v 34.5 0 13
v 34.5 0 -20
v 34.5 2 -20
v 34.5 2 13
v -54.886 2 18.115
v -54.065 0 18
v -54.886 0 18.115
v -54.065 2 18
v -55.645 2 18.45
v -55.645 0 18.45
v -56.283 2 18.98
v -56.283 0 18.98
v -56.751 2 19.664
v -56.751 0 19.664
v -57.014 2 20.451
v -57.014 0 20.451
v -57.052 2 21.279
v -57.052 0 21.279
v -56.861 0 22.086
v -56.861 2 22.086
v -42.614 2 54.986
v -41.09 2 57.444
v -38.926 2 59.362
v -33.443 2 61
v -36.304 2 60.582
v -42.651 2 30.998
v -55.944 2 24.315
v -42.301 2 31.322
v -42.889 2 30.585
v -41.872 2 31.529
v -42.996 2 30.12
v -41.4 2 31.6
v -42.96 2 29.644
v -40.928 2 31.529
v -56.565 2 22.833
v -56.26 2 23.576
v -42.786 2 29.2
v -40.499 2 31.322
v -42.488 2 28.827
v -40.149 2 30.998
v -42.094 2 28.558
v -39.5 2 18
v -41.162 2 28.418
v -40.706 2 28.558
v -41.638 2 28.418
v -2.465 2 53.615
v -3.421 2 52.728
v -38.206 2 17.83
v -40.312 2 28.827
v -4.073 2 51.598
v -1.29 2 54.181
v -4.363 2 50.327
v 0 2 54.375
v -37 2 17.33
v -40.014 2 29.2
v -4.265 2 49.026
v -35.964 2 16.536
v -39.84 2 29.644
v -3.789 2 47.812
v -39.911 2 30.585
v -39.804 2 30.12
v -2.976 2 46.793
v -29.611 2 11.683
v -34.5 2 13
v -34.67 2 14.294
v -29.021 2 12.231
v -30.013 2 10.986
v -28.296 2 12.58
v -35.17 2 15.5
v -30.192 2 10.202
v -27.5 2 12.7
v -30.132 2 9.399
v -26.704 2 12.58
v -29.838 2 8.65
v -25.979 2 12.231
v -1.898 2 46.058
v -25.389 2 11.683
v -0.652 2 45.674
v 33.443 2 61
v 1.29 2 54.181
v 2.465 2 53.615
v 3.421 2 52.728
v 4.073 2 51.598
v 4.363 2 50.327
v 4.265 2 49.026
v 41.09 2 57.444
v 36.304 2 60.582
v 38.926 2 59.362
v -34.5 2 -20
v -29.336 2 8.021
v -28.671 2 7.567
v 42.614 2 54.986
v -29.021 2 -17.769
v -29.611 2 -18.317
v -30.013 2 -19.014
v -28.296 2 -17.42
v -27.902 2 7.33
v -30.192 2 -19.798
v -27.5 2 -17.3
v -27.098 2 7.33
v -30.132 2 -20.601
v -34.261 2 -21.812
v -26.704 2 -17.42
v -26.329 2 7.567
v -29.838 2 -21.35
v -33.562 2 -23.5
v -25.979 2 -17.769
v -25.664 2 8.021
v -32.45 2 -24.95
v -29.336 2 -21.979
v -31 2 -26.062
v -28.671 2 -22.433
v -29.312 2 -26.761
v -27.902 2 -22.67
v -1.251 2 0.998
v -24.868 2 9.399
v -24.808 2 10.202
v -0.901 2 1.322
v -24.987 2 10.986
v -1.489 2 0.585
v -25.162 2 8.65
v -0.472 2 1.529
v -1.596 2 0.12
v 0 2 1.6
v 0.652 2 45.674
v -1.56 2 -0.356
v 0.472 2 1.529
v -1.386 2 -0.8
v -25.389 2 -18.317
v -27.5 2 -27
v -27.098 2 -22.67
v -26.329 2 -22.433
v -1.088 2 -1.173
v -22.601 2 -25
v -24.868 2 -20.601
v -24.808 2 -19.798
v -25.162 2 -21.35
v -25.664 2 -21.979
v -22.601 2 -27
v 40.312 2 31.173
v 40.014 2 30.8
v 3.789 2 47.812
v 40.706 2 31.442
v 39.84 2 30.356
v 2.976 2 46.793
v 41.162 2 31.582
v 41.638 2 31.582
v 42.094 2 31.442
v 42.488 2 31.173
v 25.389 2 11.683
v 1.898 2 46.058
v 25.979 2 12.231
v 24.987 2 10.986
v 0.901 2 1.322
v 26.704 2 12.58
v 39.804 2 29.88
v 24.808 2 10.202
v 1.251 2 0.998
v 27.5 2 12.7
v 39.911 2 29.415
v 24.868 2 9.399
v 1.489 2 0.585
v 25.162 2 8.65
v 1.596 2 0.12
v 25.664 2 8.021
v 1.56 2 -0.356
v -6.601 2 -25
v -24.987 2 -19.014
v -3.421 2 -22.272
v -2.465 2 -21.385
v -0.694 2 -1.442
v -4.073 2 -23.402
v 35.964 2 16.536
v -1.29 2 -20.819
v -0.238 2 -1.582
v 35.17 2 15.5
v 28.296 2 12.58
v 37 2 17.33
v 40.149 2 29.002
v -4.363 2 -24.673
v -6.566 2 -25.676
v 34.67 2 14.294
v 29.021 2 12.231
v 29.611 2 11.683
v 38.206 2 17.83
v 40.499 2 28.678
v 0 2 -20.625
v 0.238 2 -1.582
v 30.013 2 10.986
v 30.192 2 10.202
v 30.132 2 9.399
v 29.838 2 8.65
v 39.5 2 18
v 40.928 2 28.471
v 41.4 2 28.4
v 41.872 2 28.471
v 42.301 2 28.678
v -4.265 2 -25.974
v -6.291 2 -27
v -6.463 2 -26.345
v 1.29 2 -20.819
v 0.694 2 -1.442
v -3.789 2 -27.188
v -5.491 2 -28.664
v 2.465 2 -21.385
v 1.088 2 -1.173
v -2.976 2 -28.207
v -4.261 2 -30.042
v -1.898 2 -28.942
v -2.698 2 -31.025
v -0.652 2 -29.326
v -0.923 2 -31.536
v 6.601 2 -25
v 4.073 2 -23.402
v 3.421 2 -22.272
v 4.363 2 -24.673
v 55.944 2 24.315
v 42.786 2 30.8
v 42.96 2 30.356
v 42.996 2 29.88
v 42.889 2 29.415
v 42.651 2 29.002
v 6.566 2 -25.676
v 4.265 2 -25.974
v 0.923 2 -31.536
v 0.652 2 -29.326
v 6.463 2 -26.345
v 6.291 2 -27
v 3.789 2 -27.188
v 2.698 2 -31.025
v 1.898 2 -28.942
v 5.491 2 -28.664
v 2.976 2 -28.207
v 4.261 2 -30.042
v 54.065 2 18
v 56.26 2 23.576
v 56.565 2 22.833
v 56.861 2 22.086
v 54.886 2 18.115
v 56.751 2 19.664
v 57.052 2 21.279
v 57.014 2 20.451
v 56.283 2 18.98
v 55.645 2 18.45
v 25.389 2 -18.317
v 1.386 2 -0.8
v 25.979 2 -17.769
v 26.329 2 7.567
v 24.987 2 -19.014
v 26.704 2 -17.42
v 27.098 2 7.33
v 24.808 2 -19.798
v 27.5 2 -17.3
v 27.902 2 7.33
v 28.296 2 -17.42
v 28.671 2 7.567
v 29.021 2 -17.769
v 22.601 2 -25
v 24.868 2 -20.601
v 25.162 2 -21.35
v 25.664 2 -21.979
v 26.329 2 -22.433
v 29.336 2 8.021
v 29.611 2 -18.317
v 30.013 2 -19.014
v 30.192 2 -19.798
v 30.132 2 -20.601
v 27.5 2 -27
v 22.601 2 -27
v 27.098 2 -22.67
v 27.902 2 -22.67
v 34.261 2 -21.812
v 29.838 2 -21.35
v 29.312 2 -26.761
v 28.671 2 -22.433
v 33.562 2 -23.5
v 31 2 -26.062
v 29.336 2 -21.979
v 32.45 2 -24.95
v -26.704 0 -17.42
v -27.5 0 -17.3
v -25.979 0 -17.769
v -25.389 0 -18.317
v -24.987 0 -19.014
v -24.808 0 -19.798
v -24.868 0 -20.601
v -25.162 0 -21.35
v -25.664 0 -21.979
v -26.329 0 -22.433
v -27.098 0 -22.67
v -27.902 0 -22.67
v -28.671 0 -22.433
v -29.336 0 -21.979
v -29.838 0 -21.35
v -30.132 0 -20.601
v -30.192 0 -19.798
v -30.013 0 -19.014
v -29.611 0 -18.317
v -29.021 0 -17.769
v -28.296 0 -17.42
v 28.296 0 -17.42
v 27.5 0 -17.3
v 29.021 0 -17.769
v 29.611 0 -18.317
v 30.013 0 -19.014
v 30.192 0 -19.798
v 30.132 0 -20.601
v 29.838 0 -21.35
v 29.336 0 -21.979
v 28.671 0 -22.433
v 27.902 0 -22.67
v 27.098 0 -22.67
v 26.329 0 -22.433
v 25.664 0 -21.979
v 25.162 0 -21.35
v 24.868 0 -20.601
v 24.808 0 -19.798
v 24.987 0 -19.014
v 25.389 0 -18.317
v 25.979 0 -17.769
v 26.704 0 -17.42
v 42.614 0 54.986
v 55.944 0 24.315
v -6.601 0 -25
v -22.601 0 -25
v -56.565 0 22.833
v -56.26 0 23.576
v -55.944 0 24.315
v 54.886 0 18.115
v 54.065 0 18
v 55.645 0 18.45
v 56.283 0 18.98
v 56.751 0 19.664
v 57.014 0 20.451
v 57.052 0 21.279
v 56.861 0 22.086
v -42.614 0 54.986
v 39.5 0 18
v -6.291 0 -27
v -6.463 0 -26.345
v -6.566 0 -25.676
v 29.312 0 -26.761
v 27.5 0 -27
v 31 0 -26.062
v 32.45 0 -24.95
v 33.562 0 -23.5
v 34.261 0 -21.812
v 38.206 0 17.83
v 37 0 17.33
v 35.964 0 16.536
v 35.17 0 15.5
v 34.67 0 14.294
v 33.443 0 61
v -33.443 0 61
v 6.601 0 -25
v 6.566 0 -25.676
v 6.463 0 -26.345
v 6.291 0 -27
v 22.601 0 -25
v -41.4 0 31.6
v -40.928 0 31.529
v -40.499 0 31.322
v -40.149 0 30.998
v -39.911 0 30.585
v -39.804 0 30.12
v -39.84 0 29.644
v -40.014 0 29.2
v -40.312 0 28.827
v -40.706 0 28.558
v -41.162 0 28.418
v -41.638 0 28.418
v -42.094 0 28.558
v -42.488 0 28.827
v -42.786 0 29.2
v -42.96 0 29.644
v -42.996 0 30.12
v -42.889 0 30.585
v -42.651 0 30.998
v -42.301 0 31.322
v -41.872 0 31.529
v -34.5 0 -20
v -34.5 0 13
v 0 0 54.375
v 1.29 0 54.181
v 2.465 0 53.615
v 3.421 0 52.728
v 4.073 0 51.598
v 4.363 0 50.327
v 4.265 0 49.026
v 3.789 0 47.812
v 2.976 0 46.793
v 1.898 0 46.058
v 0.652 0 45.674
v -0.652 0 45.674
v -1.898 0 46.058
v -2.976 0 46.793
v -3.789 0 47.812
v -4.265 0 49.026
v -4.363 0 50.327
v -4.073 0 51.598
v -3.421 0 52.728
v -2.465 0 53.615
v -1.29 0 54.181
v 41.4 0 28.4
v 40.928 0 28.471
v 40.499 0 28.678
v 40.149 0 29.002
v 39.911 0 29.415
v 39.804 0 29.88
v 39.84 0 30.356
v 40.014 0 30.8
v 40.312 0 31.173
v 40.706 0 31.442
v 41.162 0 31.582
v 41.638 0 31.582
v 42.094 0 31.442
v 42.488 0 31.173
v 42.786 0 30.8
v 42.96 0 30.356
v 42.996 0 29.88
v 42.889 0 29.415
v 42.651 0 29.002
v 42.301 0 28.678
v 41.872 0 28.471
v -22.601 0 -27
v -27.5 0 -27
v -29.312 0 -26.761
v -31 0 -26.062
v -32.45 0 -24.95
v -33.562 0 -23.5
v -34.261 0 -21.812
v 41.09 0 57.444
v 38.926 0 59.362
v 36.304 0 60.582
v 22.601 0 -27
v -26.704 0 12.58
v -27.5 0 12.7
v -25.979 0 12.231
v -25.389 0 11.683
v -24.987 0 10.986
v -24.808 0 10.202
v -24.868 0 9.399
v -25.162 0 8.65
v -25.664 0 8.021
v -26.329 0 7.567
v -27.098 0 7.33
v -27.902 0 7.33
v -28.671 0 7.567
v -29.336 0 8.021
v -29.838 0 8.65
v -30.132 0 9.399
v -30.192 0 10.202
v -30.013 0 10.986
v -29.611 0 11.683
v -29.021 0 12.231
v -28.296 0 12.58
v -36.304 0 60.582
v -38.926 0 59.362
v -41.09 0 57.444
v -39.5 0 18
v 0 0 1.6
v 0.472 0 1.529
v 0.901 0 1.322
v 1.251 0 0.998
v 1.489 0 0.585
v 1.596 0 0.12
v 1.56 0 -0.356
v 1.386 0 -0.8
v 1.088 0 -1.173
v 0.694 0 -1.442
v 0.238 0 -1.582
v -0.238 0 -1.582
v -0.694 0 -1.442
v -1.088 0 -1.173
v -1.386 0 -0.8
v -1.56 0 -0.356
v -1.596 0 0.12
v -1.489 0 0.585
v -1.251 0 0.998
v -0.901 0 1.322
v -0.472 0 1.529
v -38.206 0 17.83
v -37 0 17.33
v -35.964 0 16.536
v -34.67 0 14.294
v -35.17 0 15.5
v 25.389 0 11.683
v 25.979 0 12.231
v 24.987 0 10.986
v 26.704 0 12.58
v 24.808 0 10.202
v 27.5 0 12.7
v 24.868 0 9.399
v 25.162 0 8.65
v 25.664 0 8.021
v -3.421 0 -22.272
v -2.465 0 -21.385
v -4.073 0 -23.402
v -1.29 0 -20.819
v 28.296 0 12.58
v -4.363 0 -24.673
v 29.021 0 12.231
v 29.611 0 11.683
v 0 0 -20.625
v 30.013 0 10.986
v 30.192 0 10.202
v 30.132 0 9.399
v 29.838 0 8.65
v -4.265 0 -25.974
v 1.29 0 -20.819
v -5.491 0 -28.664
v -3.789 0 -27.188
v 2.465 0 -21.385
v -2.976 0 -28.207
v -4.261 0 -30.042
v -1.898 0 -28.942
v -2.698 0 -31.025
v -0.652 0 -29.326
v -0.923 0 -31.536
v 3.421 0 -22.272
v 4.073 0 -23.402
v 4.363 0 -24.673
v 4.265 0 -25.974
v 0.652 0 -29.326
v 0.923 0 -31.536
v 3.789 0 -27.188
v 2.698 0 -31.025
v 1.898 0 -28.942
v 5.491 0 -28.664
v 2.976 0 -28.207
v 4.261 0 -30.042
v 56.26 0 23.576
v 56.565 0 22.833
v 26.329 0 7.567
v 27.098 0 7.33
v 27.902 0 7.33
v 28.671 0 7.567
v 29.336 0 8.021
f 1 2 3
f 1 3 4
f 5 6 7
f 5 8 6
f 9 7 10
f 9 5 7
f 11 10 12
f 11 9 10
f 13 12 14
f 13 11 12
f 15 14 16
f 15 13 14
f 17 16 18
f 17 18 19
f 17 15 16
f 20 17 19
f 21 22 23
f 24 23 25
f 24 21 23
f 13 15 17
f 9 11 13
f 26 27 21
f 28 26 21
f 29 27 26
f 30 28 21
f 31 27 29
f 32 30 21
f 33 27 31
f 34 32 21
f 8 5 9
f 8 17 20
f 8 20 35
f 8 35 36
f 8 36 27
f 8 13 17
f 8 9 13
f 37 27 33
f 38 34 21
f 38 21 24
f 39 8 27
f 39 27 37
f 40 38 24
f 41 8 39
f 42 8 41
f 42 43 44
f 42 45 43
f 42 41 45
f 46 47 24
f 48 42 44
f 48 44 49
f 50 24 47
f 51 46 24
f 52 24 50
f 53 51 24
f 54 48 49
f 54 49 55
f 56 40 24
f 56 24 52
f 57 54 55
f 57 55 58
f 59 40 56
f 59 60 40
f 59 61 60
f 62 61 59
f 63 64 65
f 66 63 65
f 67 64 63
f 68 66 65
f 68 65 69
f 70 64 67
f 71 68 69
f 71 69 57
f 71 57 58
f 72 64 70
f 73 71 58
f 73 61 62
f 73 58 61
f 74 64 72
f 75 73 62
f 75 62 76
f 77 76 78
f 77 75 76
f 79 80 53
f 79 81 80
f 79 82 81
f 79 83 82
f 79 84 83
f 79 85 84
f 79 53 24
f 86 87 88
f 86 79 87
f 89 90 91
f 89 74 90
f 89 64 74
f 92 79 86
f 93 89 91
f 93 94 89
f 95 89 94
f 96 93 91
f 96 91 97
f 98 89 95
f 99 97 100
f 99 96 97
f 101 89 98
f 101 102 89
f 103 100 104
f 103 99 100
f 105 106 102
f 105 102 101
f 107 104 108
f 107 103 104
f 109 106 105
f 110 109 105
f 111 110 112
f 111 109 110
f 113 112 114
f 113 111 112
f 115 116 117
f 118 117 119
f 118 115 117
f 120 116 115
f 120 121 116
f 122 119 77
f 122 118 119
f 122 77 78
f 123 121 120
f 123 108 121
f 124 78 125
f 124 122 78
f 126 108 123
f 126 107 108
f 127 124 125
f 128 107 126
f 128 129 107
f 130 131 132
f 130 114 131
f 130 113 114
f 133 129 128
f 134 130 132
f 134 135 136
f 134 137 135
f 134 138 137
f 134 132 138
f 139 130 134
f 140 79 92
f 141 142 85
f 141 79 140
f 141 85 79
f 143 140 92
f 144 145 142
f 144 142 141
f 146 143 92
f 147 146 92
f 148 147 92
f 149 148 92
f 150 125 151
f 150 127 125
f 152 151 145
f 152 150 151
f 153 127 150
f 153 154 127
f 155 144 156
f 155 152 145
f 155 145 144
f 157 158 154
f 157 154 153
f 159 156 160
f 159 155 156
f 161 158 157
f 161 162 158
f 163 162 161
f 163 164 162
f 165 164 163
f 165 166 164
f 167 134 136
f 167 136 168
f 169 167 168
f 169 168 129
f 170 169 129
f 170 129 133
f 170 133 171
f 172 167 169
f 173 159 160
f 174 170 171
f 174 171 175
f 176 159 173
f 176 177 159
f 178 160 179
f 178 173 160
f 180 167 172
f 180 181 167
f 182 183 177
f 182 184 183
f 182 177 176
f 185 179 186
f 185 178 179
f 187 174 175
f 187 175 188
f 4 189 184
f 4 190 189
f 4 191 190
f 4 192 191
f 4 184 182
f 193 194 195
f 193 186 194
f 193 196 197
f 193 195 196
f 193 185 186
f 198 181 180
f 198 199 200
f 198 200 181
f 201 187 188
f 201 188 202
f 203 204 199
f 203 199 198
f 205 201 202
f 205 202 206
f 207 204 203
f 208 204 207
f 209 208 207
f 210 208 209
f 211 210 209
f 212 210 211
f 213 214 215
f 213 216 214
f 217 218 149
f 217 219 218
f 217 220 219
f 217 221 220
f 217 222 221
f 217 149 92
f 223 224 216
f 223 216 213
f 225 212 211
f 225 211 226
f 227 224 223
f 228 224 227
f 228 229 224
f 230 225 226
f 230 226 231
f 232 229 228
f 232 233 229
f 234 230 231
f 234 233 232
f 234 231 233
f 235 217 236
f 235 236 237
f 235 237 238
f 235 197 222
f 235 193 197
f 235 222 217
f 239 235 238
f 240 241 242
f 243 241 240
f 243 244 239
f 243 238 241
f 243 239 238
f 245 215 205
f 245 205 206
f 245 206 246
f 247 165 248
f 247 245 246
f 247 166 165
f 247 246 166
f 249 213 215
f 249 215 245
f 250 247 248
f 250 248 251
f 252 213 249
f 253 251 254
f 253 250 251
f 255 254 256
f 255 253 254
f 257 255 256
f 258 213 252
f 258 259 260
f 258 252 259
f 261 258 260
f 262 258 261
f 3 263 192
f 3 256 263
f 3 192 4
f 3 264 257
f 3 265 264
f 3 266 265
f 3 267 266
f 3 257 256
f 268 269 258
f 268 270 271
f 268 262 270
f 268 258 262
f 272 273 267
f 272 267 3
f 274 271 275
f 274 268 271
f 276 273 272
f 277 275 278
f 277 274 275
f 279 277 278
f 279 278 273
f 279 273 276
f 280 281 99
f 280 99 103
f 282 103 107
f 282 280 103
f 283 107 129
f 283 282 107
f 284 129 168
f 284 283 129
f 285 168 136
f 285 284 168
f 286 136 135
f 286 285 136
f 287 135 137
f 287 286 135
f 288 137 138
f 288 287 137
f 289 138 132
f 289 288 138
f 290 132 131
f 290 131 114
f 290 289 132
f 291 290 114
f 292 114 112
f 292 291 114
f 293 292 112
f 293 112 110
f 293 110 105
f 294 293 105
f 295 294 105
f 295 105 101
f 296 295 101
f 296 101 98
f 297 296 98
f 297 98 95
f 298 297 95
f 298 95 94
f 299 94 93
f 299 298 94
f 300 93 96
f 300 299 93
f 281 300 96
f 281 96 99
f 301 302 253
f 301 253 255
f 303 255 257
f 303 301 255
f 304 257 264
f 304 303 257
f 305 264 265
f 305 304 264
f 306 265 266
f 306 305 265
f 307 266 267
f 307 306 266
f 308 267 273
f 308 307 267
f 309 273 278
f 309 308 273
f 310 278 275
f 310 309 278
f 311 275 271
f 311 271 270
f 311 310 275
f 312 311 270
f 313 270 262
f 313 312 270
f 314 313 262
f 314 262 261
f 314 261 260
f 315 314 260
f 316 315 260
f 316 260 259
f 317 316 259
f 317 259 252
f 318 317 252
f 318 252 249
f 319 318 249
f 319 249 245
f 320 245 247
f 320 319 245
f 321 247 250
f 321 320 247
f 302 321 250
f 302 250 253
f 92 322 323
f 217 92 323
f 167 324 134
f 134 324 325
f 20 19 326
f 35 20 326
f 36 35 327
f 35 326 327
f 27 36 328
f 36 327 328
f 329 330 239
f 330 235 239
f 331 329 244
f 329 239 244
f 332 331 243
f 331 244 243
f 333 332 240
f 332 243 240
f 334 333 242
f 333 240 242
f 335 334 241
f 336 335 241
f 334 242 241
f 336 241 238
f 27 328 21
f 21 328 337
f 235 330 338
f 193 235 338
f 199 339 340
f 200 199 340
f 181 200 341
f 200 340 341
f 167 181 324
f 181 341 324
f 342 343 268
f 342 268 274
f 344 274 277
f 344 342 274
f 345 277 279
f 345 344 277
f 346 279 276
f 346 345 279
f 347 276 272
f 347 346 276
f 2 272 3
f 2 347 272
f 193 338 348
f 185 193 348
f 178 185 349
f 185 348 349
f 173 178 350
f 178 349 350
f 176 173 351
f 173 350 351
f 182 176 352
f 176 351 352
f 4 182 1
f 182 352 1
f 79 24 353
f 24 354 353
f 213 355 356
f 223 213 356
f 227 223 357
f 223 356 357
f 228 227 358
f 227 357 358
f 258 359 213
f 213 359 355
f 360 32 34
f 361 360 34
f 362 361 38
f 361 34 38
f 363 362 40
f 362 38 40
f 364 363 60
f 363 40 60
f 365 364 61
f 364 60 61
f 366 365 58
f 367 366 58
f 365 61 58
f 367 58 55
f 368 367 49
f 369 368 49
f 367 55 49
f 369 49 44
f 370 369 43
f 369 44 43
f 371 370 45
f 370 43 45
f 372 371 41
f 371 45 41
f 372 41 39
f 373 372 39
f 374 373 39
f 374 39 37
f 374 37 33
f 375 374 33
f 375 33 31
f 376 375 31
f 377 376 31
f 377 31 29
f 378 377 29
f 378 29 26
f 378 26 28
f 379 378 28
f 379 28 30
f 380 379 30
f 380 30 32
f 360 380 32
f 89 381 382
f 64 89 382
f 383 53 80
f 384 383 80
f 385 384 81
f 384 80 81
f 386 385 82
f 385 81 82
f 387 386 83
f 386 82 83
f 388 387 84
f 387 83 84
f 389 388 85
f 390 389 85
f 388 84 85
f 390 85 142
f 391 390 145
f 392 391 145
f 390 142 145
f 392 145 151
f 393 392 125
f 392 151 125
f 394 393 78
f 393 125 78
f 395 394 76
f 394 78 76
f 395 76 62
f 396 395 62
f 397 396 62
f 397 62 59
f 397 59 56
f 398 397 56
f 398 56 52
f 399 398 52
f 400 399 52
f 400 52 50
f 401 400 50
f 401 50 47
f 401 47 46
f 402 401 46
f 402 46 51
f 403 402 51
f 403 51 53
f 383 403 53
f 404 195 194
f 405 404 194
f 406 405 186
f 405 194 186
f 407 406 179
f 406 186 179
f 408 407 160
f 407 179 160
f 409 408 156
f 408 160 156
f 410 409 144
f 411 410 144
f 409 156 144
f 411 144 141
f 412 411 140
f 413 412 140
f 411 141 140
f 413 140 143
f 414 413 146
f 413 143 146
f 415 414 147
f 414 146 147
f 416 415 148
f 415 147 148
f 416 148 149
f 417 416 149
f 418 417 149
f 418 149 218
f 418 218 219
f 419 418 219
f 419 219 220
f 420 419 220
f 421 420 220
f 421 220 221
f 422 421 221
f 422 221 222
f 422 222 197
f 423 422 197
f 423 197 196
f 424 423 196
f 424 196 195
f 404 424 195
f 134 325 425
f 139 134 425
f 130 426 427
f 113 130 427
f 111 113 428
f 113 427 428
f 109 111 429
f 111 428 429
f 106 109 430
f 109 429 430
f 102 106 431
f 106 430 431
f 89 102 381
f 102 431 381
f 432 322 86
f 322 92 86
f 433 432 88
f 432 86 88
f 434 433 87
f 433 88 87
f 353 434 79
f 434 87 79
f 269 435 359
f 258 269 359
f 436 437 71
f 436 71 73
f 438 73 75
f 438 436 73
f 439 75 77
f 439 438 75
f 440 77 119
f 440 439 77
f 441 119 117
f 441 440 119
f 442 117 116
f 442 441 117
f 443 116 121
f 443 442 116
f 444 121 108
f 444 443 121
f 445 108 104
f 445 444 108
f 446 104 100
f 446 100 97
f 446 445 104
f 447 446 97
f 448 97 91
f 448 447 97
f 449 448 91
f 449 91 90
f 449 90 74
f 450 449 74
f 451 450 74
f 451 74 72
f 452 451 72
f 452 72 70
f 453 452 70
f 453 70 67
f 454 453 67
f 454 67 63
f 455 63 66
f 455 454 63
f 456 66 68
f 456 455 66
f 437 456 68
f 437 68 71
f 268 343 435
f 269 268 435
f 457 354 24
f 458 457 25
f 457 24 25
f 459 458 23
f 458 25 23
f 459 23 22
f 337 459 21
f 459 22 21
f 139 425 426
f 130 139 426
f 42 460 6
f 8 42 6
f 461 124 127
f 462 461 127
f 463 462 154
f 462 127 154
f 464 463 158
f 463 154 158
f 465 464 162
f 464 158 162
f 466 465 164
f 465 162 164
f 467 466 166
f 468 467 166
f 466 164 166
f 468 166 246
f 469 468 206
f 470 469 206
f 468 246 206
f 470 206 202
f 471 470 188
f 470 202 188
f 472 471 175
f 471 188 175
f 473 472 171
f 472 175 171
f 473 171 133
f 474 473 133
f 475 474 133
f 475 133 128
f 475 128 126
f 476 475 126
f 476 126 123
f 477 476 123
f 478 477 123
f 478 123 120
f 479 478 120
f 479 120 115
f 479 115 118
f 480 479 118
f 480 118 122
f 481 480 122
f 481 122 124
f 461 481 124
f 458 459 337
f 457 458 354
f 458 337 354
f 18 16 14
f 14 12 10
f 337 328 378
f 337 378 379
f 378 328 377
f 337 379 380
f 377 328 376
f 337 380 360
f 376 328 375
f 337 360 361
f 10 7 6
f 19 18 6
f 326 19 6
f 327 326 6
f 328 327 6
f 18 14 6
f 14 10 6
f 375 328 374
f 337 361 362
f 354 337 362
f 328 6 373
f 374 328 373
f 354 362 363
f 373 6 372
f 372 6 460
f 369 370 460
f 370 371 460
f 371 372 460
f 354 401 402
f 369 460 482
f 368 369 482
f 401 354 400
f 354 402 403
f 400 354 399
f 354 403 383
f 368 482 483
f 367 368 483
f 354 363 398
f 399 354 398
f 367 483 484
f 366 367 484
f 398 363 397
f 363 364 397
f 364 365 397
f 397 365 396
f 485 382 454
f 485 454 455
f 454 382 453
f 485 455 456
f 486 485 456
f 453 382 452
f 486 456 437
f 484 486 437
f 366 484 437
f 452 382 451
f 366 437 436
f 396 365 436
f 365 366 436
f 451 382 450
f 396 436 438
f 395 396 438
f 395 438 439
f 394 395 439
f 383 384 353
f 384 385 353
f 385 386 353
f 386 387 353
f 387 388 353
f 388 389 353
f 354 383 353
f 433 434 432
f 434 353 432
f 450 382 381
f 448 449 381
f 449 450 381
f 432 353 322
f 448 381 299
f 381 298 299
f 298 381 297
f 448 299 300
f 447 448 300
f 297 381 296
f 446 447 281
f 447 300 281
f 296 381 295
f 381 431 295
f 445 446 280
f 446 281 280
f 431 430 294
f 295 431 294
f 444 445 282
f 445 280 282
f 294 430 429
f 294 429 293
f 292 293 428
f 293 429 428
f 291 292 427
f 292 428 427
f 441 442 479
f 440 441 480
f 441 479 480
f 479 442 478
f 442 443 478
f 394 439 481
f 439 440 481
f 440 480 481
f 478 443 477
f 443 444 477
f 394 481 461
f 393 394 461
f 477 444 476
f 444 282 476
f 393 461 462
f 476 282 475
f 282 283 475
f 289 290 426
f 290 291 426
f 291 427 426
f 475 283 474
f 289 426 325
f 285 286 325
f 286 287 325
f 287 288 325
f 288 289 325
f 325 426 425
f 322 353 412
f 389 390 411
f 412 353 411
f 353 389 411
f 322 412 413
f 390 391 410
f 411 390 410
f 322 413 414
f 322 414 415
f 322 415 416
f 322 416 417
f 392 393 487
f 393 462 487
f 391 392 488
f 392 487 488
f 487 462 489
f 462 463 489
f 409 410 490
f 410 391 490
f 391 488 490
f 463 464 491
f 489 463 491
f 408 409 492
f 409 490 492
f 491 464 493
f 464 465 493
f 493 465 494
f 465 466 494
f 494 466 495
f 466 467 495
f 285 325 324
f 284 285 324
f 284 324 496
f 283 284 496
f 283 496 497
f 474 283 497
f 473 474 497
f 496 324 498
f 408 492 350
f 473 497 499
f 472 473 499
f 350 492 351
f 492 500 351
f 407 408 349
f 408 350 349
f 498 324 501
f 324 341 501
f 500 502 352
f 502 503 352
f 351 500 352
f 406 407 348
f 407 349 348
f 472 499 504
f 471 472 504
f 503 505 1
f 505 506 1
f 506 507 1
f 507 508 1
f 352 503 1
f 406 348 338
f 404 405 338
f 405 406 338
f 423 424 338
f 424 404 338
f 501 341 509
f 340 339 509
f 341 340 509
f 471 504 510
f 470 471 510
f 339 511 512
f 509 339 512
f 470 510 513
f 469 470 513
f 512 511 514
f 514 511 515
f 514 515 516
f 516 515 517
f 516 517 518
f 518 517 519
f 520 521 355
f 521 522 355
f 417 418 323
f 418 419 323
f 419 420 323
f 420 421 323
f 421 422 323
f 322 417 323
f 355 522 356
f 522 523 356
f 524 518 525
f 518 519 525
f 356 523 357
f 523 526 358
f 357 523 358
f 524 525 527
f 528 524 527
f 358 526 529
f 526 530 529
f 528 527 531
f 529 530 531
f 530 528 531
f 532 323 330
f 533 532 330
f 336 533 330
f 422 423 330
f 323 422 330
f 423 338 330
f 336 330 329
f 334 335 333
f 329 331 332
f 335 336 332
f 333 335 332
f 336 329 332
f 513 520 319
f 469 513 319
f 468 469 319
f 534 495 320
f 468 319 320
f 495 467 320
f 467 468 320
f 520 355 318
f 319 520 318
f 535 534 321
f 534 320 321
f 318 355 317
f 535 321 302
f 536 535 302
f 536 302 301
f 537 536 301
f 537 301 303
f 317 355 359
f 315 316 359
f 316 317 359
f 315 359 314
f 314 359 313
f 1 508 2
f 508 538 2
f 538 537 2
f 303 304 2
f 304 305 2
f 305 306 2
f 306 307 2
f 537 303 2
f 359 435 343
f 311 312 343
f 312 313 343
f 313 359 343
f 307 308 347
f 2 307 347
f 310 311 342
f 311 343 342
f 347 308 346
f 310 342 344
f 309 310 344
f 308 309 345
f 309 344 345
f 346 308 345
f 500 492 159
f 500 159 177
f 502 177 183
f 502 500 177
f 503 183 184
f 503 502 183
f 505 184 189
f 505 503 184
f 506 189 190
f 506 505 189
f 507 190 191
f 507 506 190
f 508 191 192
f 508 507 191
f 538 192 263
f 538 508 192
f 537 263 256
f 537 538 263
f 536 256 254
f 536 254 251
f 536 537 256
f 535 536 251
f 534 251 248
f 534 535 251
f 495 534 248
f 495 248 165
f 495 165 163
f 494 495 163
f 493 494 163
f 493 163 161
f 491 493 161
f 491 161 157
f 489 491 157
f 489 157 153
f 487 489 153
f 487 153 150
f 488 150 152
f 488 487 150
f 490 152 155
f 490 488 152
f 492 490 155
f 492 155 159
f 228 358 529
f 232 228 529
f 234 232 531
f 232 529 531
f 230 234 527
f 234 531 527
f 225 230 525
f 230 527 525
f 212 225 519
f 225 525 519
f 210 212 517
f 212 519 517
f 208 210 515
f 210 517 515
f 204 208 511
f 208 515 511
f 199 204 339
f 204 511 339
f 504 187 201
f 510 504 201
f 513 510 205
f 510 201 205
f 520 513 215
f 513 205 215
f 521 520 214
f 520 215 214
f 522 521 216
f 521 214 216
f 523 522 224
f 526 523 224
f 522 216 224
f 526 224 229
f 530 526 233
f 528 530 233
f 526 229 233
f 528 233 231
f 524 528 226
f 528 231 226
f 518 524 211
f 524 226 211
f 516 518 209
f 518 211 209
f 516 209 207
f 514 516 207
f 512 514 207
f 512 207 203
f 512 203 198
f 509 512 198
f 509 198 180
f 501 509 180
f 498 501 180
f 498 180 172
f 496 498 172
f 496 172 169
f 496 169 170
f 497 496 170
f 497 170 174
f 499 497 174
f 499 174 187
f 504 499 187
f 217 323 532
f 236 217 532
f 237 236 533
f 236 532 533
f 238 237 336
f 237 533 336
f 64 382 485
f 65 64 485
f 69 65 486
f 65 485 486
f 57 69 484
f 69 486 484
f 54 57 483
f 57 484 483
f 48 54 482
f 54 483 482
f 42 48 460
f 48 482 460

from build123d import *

# Parameters (mm, degrees)
SKETCH1_R           = 2.7
BOSS_EXTRUDE1_DEPTH = 2
BOSS_EXTRUDE2_START = -2
BOSS_EXTRUDE2_DEPTH = 2
FILLET1_R           = 3
SKETCH2_R           = 4.375
SKETCH2_R_2         = 1.6
CUT_EXTRUDE1_DEPTH  = 84.55470457
FILLET2_R           = 10


with BuildPart() as part:
    # Sketch1 → Boss-Extrude1 (new body)
    # profile 1 of 9: a face of its own
    with BuildSketch(Plane(origin=(0, 0, 0), x_dir=(1, 0, 0), z_dir=(0, 1, 0))):
        with BuildLine():
            Line((-34.5, 20), (-34.5, -10))
            ThreePointArc((-34.5, -10), (-27.5, -17), (-20.5, -10))
            Line((-20.5, -10), (-20.5, 20))
            ThreePointArc((-20.5, 20), (-27.5, 27), (-34.5, 20))
        make_face()
        with Locations(Location((-27.5, 20, 0), (0, 0, 270))):
            Circle(SKETCH1_R, mode=Mode.SUBTRACT)
        with Locations(Location((-27.5, -10, 0), (0, 0, 270))):
            Circle(SKETCH1_R, mode=Mode.SUBTRACT)
    # profile 2 of 9: a face of its own
    with BuildSketch(Plane(origin=(0, 0, 0), x_dir=(1, 0, 0), z_dir=(0, 1, 0))):
        with BuildLine():
            ThreePointArc((-22.601020514, 25), (-21.046595612, 22.711747002), (-20.5, 20))
            Line((-20.5, 20), (-20.5, -10))
            ThreePointArc((-20.5, -10), (-27.5, -17), (-34.5, -10))
            Line((-34.5, -10), (-34.5, -50.306560208))
            ThreePointArc((-34.5, -50.306560208), (0, -61), (34.5, -50.306560208))
            Line((34.5, -50.306560208), (34.5, -10))
            ThreePointArc((34.5, -10), (27.5, -17), (20.5, -10))
            Line((20.5, -10), (20.5, 20))
            ThreePointArc((20.5, 20), (21.046595612, 22.711747002), (22.601020514, 25))
            Line((22.601020514, 25), (6.601020514, 25))
            ThreePointArc((6.601020514, 25), (0, 18.398979486), (-6.601020514, 25))
            Line((-6.601020514, 25), (-22.601020514, 25))
        make_face()
    # profile 3 of 9: a face of its own
    with BuildSketch(Plane(origin=(0, 0, 0), x_dir=(1, 0, 0), z_dir=(0, 1, 0))):
        with BuildLine():
            ThreePointArc((34.5, -10), (27.5, -17), (20.5, -10))
            Line((20.5, -10), (20.5, 20))
            ThreePointArc((20.5, 20), (27.5, 27), (34.5, 20))
            Line((34.5, 20), (34.5, -10))
        make_face()
        with Locations(Location((27.5, -10, 0), (0, 0, 270))):
            Circle(SKETCH1_R, mode=Mode.SUBTRACT)
        with Locations(Location((27.5, 20, 0), (0, 0, 270))):
            Circle(SKETCH1_R, mode=Mode.SUBTRACT)
    # profile 4 of 9: a face of its own
    with BuildSketch(Plane(origin=(0, 0, 0), x_dir=(1, 0, 0), z_dir=(0, 1, 0))):
        with BuildLine():
            ThreePointArc((-6.290744935, 27), (-6.522990426, 26.011962318), (-6.601020514, 25))
            ThreePointArc((-6.601020514, 25), (0, 18.398979486), (6.601020514, 25))
            ThreePointArc((6.601020514, 25), (6.522990426, 26.011962318), (6.290744935, 27))
            Line((6.290744935, 27), (-6.290744935, 27))
        make_face()
    # profile 5 of 9: a face of its own
    with BuildSketch(Plane(origin=(0, 0, 0), x_dir=(1, 0, 0), z_dir=(0, 1, 0))):
        with BuildLine():
            ThreePointArc((6.290744935, 27), (0, 31.601020514), (-6.290744935, 27))
            Line((-6.290744935, 27), (6.290744935, 27))
        make_face()
    # profile 6 of 9: a face of its own
    with BuildSketch(Plane(origin=(0, 0, 0), x_dir=(1, 0, 0), z_dir=(0, 1, 0))):
        with BuildLine():
            ThreePointArc((-6.290744935, 27), (-6.522990426, 26.011962318), (-6.601020514, 25))
            ThreePointArc((-6.601020514, 25), (0, 18.398979486), (6.601020514, 25))
            ThreePointArc((6.601020514, 25), (6.522990426, 26.011962318), (6.290744935, 27))
            Line((6.290744935, 27), (-6.290744935, 27))
        make_face()
    # profile 7 of 9: a face of its own
    with BuildSketch(Plane(origin=(0, 0, 0), x_dir=(1, 0, 0), z_dir=(0, 1, 0))):
        with BuildLine():
            ThreePointArc((6.290744935, 27), (0, 31.601020514), (-6.290744935, 27))
            Line((-6.290744935, 27), (6.290744935, 27))
        make_face()
    # profile 8 of 9: a face of its own
    with BuildSketch(Plane(origin=(0, 0, 0), x_dir=(1, 0, 0), z_dir=(0, 1, 0))):
        with BuildLine():
            ThreePointArc((-27.5, 27), (-24.854248689, 26.480740698), (-22.601020514, 25))
            Line((-22.601020514, 25), (-22.601020514, 27))
            Line((-22.601020514, 27), (-27.5, 27))
        make_face()
    # profile 9 of 9: a face of its own
    with BuildSketch(Plane(origin=(0, 0, 0), x_dir=(1, 0, 0), z_dir=(0, 1, 0))):
        with BuildLine():
            Line((22.601020514, 27), (22.601020514, 25))
            ThreePointArc((22.601020514, 25), (24.854248689, 26.480740698), (27.5, 27))
            Line((27.5, 27), (22.601020514, 27))
        make_face()
    extrude(amount=BOSS_EXTRUDE1_DEPTH)

    # Sketch5 → Boss-Extrude2 (add)
    with BuildSketch(Plane(origin=(0, 2, 0), x_dir=(1, 0, 0), z_dir=(0, 1, 0)).offset(BOSS_EXTRUDE2_START)):
        with BuildLine():
            Line((-55.944371359, -24.315166322), (-40, -61))
            Line((-40, -61), (0, -61))
            ThreePointArc((0, -61), (-18.059621083, -58.265342068), (-34.5, -50.306560208))
            Line((-34.5, -50.306560208), (-34.5, -13))
            ThreePointArc((-34.5, -13), (-35.964466094, -16.535533906), (-39.5, -18))
            Line((-39.5, -18), (-58.283788484, -18))
            ThreePointArc((-58.283788484, -18), (-57.201297683, -21.189892481), (-55.944371359, -24.315166322))
        make_face()
        with BuildLine():
            ThreePointArc((34.5, -50.306560208), (18.059621083, -58.265342068), (0, -61))
            Line((0, -61), (40, -61))
            Line((40, -61), (55.944371359, -24.315166322))
            ThreePointArc((55.944371359, -24.315166322), (57.201297683, -21.189892481), (58.283788484, -18))
            Line((58.283788484, -18), (39.5, -18))
            ThreePointArc((39.5, -18), (35.964466094, -16.535533906), (34.5, -13))
            Line((34.5, -13), (34.5, -50.306560208))
        make_face()
    extrude(amount=BOSS_EXTRUDE2_DEPTH)

    # Fillet1
    fillet1_edges = [part.edges().sort_by_distance(p)[0] for p in [
        (-58.283788484, 1, 18),
        (58.283788484, 1, 18),
    ]]
    fillet(fillet1_edges, radius=FILLET1_R)

    # Sketch2 → Cut-Extrude1 (cut, through all)
    with BuildSketch(Plane(origin=(0, 2, 0), x_dir=(1, 0, 0), z_dir=(0, 1, 0))):
        with Locations(Location((0, 25, 0), (0, 0, 270))):
            Circle(SKETCH2_R)
        with Locations(Location((0, -50, 0), (0, 0, 270))):
            Circle(SKETCH2_R)
        with Locations(Location((0, 0, 0), (0, 0, 270))):
            Circle(SKETCH2_R_2)
        with Locations(Location((-41.4, -30, 0), (0, 0, 270))):
            Circle(SKETCH2_R_2)
        with Locations(Location((41.4, -30, 0), (0, 0, 90))):
            Circle(SKETCH2_R_2)
    extrude(amount=-CUT_EXTRUDE1_DEPTH, mode=Mode.SUBTRACT)

    # Fillet2
    fillet2_edges = [part.edges().sort_by_distance(p)[0] for p in [
        (-40, 1, 61),
        (40, 1, 61),
    ]]
    fillet(fillet2_edges, radius=FILLET2_R)


solid = part.part
